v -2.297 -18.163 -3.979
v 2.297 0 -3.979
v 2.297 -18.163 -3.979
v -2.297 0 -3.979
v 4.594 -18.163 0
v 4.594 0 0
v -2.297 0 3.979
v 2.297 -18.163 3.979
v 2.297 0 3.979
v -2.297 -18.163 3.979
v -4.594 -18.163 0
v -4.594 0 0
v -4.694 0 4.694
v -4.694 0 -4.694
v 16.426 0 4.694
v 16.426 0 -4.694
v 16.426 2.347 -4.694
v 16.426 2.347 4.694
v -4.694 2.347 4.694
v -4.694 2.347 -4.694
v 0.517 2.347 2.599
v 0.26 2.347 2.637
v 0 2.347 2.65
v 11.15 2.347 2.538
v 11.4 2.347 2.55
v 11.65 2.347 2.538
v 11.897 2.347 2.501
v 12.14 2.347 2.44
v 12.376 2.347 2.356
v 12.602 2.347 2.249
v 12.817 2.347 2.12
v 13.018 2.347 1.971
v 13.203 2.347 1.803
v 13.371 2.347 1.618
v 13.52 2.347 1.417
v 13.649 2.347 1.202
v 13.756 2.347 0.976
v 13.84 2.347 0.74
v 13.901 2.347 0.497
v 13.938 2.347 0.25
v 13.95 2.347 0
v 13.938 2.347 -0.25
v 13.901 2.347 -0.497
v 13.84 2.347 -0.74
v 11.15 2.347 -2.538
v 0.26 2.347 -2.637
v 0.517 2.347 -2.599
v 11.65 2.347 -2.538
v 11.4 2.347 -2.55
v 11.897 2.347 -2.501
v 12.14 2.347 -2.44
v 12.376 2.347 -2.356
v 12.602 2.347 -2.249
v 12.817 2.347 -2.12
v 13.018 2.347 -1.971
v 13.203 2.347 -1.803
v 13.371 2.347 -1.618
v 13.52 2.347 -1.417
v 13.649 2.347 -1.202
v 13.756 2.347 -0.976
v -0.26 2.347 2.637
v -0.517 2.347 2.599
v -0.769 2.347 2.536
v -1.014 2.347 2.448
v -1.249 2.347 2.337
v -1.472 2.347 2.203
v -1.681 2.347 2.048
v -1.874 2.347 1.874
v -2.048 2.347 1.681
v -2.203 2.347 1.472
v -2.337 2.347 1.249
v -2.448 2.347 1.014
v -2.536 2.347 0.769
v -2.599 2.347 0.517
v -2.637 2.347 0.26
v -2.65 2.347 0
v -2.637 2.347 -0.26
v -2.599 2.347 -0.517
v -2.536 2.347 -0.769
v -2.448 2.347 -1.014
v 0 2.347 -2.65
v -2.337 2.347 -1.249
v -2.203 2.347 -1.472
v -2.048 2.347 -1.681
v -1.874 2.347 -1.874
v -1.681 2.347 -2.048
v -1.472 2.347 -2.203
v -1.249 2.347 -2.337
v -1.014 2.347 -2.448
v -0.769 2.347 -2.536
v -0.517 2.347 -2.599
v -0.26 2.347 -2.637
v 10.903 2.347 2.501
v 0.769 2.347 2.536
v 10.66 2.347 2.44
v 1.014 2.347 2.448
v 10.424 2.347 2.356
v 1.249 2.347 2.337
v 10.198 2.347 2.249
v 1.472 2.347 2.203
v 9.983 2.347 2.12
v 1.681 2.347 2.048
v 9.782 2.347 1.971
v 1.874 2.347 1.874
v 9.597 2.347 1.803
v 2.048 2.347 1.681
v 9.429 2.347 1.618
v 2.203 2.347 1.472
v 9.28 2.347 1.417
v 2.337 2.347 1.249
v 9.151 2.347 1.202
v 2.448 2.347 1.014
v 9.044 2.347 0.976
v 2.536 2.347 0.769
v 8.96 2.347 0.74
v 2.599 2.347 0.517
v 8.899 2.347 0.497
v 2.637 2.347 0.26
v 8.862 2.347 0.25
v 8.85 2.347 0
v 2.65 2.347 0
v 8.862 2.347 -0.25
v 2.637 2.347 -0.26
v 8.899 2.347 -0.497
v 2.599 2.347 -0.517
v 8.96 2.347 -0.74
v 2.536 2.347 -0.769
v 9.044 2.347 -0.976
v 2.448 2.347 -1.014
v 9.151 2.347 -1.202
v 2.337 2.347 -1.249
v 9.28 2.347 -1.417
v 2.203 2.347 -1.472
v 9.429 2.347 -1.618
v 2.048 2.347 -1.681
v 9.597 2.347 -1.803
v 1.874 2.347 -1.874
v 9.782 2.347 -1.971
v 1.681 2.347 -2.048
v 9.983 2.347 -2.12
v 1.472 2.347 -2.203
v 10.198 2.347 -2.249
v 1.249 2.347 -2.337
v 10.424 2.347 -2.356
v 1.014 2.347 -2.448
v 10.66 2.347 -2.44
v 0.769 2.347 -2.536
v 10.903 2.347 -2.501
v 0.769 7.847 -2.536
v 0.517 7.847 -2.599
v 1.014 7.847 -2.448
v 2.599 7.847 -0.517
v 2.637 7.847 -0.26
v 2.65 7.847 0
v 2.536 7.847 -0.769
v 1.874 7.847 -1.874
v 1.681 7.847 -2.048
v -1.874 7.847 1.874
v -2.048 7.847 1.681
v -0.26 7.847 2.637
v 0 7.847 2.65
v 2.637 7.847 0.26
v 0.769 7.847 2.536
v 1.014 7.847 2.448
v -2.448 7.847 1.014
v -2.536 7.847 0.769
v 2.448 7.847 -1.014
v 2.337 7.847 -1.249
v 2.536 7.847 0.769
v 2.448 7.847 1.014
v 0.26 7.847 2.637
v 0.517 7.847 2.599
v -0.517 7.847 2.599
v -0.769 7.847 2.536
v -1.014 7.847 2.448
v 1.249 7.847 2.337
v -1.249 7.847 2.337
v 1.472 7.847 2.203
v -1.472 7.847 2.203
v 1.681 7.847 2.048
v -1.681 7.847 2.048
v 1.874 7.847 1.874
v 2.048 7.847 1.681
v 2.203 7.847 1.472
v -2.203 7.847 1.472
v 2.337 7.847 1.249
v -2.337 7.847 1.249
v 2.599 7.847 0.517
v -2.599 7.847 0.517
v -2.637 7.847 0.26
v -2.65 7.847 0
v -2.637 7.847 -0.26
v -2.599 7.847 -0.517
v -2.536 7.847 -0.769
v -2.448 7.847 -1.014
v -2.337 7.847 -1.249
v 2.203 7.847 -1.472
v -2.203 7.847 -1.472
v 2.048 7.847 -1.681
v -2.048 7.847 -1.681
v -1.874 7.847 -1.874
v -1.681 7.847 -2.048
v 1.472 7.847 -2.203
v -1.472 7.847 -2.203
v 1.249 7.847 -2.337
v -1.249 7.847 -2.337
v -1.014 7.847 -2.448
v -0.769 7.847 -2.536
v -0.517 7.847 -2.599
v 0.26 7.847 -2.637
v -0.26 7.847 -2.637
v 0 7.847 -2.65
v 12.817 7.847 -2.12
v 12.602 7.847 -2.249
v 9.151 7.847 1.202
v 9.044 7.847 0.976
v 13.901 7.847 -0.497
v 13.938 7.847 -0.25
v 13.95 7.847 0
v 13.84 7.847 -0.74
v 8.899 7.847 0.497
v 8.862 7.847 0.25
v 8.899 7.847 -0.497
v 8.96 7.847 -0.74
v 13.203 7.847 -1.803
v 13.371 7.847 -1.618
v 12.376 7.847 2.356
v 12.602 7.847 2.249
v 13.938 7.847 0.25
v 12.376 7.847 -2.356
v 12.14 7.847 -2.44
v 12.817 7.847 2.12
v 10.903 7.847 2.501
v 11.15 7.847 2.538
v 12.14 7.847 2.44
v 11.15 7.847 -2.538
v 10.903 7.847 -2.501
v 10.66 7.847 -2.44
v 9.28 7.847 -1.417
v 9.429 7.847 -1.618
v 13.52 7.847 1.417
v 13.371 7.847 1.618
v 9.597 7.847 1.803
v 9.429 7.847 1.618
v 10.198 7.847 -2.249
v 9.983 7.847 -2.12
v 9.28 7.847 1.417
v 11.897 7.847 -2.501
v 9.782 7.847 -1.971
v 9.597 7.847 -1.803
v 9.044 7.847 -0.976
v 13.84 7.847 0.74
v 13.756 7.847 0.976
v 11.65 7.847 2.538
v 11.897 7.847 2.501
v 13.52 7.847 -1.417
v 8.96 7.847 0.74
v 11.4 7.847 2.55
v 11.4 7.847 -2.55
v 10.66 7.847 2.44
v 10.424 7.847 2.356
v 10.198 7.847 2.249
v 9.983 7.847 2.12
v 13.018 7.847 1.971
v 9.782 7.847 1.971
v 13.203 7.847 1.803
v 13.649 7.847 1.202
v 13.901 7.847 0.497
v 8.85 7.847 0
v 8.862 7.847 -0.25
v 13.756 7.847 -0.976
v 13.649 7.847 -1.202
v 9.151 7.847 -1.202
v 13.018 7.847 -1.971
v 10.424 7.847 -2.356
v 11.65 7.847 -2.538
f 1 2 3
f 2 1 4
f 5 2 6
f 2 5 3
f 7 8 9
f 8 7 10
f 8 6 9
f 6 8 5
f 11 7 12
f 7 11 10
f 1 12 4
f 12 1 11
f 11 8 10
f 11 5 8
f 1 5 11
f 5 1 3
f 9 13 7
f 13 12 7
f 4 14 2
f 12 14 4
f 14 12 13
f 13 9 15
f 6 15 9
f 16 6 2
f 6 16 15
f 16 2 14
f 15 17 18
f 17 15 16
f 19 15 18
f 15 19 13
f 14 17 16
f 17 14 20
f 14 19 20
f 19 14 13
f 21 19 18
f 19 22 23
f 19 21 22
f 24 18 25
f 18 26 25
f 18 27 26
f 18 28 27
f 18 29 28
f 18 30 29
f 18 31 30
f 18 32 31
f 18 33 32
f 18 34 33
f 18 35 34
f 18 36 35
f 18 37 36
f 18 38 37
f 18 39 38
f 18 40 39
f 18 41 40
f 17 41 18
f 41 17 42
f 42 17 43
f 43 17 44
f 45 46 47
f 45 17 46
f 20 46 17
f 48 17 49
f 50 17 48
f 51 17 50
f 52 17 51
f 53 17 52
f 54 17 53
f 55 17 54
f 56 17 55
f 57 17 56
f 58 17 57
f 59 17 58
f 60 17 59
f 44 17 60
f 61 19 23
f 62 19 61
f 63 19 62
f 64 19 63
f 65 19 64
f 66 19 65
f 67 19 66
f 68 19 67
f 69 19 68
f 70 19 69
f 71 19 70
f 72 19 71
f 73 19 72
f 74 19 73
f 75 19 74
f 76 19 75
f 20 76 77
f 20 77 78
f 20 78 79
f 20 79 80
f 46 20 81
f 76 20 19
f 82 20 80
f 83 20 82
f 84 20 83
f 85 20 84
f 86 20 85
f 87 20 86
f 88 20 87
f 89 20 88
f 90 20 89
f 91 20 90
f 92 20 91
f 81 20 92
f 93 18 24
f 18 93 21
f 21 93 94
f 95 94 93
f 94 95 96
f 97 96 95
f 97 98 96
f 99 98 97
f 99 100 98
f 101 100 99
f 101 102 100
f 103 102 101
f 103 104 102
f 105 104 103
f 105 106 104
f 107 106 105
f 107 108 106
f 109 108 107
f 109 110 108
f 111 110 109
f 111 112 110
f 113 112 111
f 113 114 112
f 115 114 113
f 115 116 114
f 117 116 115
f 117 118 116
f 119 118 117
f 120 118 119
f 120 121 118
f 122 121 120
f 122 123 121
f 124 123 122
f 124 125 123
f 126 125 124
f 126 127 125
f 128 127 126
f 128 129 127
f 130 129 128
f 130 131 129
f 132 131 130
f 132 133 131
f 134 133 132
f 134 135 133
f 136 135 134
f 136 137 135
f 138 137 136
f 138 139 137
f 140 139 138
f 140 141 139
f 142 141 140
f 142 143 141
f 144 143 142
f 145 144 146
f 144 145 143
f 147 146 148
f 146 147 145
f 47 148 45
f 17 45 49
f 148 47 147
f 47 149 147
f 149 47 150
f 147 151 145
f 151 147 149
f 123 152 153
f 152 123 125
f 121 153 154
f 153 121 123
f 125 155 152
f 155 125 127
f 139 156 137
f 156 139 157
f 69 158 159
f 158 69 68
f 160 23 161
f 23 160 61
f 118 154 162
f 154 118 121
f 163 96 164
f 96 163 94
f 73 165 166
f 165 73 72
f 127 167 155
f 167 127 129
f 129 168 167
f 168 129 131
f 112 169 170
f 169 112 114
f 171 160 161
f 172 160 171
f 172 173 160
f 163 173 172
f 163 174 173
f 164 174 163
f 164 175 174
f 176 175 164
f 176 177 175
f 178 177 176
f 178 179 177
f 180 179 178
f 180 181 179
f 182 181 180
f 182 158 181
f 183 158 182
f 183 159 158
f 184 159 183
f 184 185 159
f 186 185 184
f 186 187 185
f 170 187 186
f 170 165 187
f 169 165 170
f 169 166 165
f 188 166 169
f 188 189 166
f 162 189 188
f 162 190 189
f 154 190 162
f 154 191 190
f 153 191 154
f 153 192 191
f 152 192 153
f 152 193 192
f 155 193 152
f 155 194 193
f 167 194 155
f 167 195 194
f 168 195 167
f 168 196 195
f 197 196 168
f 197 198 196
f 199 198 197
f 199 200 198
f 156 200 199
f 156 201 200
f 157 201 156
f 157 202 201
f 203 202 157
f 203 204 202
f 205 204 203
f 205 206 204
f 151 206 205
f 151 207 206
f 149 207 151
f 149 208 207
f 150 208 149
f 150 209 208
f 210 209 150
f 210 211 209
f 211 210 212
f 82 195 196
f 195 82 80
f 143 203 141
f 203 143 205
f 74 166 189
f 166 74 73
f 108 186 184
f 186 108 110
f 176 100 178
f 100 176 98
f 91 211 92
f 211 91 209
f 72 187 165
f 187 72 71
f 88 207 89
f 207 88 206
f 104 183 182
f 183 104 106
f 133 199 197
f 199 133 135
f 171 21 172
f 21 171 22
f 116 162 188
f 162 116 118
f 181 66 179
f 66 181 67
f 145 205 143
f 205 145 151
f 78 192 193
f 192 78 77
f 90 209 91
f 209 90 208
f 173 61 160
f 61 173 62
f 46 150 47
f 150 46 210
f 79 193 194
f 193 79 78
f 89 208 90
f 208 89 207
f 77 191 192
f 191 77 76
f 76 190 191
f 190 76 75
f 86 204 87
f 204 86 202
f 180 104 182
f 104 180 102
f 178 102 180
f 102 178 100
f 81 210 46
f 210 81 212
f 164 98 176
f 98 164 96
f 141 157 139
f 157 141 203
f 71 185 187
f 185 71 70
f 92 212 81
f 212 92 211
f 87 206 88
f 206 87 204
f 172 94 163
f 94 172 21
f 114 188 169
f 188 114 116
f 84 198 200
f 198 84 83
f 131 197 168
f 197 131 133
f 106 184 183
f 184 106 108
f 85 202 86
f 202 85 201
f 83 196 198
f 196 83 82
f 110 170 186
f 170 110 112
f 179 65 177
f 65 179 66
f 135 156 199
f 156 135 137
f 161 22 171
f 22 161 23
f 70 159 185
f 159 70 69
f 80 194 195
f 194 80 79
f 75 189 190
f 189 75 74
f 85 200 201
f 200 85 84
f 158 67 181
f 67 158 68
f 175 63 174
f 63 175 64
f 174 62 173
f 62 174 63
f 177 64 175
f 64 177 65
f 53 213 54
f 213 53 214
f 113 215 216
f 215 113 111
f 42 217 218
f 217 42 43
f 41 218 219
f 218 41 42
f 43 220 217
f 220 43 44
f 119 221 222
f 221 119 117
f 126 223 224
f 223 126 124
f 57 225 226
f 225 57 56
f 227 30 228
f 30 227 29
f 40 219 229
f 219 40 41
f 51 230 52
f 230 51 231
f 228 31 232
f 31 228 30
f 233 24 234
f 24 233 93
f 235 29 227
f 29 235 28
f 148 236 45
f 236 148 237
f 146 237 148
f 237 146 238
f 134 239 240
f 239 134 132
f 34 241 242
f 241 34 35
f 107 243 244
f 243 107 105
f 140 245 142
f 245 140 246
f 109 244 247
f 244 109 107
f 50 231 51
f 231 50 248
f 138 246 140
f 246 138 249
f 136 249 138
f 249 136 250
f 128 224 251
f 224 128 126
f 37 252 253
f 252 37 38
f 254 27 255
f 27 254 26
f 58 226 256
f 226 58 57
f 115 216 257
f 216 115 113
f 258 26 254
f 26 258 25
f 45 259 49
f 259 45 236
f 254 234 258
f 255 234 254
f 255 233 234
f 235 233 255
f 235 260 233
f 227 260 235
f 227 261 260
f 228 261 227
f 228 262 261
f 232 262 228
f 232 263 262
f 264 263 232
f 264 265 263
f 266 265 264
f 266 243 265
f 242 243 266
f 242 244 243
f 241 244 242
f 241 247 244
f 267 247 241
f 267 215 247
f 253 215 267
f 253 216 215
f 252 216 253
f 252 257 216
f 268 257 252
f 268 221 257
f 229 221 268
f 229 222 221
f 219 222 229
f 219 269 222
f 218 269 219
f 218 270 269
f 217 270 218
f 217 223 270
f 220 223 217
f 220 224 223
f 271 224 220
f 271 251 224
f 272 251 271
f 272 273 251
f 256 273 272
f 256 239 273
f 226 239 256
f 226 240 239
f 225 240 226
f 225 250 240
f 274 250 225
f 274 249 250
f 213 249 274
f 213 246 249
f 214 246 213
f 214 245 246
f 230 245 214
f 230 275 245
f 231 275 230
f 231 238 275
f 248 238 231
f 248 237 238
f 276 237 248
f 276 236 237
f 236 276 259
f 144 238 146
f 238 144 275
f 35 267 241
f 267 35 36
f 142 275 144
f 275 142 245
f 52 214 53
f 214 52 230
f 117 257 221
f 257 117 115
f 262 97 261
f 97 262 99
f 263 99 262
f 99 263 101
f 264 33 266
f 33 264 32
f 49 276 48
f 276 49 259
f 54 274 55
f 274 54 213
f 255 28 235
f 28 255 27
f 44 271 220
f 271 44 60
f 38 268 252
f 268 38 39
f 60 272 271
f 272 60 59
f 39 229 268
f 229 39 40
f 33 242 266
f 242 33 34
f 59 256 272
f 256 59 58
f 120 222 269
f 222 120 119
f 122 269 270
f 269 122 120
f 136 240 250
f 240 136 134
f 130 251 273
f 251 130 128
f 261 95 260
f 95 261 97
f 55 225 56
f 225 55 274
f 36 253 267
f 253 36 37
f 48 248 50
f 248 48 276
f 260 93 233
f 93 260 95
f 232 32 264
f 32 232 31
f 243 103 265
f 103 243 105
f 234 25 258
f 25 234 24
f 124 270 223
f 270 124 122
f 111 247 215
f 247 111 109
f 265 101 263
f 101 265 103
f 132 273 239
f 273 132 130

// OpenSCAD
$fn=64;


union() {
	union() {
		union() {
			rotate(a = [90, 0, 0]) {
				union() {
					translate(v = [0, 0, 10]) {
						cylinder(r1 = 4.5944444444, r2 = 4.5944444444, $fn = 6, h = 8.1629146123);
					}
					cylinder($fn = 6, h = 10, r = 4.5944444444);
				}
			}
			translate(v = [0, 0, -4.6944444444]) {
				translate(v = [-4.6944444444, 0, 0]) {
					cube(size = [21.1200000000, 2.3472222222, 9.3888888889]);
				}
			}
		}
		translate(v = [0, 2.3472222222, 0]) {
			rotate(a = [-90, 0, 0]) {
				cylinder(h = 5.5000000000, r = 2.6500000000);
			}
		}
	}
	translate(v = [11.4000000000, 0, 0]) {
		translate(v = [0, 2.3472222222, 0]) {
			rotate(a = [-90, 0, 0]) {
				cylinder(h = 5.5000000000, r = 2.5500000000);
			}
		}
	}
}
